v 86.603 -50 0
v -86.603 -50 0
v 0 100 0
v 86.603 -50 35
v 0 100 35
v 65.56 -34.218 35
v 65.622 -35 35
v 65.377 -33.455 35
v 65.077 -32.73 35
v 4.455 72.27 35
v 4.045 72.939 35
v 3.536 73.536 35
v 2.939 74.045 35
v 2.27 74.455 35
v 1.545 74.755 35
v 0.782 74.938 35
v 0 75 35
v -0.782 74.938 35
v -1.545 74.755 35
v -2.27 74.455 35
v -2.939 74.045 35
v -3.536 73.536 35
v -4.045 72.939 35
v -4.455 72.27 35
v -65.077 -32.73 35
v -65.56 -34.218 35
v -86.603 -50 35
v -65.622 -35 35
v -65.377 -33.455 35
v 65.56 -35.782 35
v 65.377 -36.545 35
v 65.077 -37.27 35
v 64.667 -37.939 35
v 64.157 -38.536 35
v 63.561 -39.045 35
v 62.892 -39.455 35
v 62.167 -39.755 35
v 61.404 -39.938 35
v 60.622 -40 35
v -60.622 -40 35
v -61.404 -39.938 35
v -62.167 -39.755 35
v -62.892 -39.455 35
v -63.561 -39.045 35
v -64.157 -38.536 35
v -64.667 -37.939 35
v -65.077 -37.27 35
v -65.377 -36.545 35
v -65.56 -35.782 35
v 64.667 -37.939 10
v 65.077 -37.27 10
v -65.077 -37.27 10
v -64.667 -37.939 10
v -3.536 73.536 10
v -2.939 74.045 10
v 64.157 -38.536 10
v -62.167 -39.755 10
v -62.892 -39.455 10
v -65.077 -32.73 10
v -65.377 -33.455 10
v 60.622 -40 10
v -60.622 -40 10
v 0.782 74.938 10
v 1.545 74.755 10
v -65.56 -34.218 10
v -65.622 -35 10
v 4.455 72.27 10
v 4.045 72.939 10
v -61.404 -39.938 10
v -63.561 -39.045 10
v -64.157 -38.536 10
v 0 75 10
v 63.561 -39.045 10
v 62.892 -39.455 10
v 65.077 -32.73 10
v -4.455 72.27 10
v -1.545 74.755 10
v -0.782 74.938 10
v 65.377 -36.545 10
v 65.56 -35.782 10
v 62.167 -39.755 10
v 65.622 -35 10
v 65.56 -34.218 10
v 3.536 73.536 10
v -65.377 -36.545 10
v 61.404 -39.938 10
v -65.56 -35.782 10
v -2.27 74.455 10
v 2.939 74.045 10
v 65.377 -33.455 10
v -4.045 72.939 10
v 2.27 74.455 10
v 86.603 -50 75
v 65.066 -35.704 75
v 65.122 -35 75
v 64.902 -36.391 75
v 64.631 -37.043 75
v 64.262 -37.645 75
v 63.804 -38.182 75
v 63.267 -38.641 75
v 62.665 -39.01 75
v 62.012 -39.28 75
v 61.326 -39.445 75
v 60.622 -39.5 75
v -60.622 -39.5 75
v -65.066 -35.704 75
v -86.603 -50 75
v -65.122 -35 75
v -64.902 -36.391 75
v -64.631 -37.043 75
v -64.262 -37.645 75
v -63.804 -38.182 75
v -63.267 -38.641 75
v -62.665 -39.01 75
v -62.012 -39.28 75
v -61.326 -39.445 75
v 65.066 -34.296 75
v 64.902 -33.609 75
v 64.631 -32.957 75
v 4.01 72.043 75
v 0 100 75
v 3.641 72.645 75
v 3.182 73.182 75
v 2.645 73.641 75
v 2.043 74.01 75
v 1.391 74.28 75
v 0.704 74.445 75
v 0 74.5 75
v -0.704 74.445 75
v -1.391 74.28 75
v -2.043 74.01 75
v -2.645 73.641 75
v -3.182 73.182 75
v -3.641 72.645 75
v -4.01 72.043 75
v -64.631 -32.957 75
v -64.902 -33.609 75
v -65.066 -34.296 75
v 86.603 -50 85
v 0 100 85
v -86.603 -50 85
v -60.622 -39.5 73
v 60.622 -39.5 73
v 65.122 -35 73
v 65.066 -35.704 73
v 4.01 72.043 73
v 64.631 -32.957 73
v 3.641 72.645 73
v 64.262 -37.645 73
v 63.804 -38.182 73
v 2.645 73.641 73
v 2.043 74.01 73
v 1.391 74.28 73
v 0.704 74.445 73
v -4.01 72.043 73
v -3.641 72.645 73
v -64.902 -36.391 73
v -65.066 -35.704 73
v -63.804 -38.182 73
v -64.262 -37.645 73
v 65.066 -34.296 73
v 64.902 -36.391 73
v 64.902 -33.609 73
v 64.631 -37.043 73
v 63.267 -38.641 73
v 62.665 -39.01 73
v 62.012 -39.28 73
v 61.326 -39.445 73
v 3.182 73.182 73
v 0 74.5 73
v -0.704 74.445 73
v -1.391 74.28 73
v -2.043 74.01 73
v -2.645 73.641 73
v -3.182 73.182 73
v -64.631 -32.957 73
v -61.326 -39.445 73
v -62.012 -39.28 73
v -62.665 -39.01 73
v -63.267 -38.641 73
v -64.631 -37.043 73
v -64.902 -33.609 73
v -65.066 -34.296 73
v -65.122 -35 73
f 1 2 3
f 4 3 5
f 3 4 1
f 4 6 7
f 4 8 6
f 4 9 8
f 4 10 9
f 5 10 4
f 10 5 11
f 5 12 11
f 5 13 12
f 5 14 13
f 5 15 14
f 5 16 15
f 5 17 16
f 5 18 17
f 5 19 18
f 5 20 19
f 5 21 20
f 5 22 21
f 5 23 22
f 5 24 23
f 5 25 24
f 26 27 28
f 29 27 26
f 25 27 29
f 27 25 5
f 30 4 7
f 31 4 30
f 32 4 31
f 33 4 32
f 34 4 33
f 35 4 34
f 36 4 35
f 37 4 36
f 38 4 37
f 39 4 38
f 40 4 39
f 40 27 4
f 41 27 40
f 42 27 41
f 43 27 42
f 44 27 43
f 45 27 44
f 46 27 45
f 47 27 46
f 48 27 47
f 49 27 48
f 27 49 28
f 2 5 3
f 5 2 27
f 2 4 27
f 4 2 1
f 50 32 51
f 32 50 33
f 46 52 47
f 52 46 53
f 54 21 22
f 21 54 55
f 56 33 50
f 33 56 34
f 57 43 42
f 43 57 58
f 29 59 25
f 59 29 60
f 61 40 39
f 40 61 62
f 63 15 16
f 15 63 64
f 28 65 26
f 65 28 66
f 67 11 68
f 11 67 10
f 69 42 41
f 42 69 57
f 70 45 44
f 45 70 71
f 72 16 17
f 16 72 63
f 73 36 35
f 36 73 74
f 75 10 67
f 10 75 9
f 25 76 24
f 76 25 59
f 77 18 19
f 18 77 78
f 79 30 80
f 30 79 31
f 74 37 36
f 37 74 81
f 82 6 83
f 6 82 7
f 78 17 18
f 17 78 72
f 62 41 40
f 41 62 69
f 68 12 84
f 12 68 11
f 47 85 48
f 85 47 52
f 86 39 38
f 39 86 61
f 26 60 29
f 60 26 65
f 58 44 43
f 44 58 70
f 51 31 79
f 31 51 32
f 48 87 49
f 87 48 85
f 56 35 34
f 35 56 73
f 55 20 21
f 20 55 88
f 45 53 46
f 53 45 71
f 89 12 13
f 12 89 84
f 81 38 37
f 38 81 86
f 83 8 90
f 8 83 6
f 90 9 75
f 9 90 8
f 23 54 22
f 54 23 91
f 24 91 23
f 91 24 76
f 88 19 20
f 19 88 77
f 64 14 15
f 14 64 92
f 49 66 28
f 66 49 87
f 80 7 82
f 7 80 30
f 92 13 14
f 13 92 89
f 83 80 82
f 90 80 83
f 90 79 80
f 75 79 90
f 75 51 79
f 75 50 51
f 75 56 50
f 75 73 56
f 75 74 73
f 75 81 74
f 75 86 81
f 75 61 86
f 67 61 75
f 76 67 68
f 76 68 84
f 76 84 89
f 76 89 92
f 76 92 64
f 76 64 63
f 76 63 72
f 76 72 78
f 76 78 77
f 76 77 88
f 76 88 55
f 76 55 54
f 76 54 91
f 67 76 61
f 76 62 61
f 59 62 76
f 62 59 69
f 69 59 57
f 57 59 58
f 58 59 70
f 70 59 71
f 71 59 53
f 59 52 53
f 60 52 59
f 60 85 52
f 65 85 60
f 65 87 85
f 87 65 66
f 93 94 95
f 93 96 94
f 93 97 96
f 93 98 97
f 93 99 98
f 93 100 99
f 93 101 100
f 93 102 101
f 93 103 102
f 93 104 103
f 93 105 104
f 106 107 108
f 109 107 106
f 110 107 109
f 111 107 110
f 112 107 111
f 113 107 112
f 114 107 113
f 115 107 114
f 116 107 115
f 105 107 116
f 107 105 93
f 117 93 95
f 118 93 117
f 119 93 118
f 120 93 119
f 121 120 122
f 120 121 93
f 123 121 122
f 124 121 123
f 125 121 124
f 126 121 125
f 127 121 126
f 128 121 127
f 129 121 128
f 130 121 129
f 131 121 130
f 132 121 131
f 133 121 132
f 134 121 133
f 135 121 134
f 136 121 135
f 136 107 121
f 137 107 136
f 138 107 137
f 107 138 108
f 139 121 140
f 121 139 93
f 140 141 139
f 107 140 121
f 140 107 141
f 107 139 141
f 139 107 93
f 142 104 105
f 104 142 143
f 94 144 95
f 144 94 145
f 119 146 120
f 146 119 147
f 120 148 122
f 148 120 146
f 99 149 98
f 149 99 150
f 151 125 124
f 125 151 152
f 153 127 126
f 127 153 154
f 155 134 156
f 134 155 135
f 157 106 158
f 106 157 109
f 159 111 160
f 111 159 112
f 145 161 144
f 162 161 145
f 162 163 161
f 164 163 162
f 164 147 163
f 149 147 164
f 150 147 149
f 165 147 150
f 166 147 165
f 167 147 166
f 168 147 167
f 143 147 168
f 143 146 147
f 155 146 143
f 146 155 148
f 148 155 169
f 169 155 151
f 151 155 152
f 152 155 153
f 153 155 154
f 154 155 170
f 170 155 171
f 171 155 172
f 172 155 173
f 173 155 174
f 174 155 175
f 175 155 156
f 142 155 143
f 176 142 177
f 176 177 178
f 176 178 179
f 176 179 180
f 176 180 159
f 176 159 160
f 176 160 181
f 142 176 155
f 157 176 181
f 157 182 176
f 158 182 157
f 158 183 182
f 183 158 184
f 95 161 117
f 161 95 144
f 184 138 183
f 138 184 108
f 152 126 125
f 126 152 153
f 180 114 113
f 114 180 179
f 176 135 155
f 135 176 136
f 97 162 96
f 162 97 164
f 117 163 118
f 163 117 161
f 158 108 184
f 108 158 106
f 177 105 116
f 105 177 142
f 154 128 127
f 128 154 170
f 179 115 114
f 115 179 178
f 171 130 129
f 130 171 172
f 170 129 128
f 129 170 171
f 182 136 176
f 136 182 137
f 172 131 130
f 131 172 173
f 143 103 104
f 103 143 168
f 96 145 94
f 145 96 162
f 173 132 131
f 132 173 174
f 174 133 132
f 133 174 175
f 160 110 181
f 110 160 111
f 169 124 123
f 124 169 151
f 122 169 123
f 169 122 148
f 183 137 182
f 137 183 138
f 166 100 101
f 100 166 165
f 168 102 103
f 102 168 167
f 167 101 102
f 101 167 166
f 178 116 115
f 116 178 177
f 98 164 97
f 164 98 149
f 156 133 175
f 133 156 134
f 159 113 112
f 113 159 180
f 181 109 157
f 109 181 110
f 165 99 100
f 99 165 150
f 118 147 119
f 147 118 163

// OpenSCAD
// file: modules.scad
module drawBox(radius, height, crust, drillRadius) {
  difference() {
    drawBoxBase(radius, height, 0);
    cavityRadius = (radius * sin(30) - crust) / sin(30);
    translate([0, 0, crust]) {
      drawBoxBase(cavityRadius, height, drillRadius);
    }
  }
}

module drawBoxBase(radius, height, cornerRadius) {
  sr = (cornerRadius > 1) ? 1 : 0;
  modRadius = (radius * sin(30) - cornerRadius) / sin(30);
  minkowski() {
    cylinder(r = cornerRadius, h = 1, $fn = 40);
    hull() {
      drawTriangle(modRadius, 0, 0, 0); // Bottom
      translate([0, 0, height - sr]) drawTriangle(modRadius, 0, 0, 0); // Top
    }
  }
}

module drawCap(radius, height, z1, z2, z3, crust, drillRadius) {
  union() {
    drawCapBase(radius, height, z1, z2, z3, 0);
    cavityRadius = (radius * sin(30) - crust) / sin(30);
    translate([0, 0, -2]) {
      drawCapBase(cavityRadius, height, 0, 0, 0, drillRadius);
    }
  }
}

module drawCapBase(radius, height, z1, z2, z3, cornerRadius) {
  sr = (cornerRadius > 1) ? 1 : 0;
  modRadius = (radius * sin(30) - cornerRadius) / sin(30);
  minkowski() {
    cylinder(r = cornerRadius, h = 1, $fn = 40);
    hull() {
      drawTriangle(modRadius, 0, 0, 0); // Bottom
      translate([0, 0, height - sr]) drawTriangle(modRadius, z1, z2, z3); // Top
    }
  }
}

module drawTriangle(radius, z1, z2, z3) {
  polyhedron(
    points = [[0, radius, z1], 
              [cos(30)*radius, -sin(30)*radius, z2], 
              [-cos(30)*radius, -sin(30)*radius, z3]], 
    faces = [[0, 1, 2]]
  );
}

// Test modules, check the gaps

boxRadius = 100;
boxHeight = 35;
boxWallThickness = 10;
innerCornerRadius = 5;
capHeight = 10;
capWallThickness = 10.5;

// Draw box
projection(cut=true) 
  translate([0,0,-20])
    drawBox(boxRadius, boxHeight, boxWallThickness, innerCornerRadius);

// Draw cap
// Notice that you have to remove the wall thickness difference between the box wall thickness and cap wall thickness from the innerCornerRadius
projection(cut = true) 
  translate([0,0,1])
    drawCap(boxRadius, capHeight, 0, 0, 0, capWallThickness, innerCornerRadius - (capWallThickness - boxWallThickness));
// main file
use <modules.scad>;

boxRadius = 100;
boxHeight = 35;
boxWallThickness = 10;
innerCornerRadius = 5;
capHeight = 10;
capWallThickness = 10.5;

// Draw box
translate([0,0,0])
  drawBox(boxRadius, boxHeight, boxWallThickness, innerCornerRadius);

// Draw cap
// Notice that you have to remove the wall thickness difference between the box wall thickness and cap wall thickness from the innerCornerRadius
translate([0,0,75])
  drawCap(boxRadius, capHeight, 0, 0, 0, capWallThickness, innerCornerRadius - (capWallThickness - boxWallThickness));
